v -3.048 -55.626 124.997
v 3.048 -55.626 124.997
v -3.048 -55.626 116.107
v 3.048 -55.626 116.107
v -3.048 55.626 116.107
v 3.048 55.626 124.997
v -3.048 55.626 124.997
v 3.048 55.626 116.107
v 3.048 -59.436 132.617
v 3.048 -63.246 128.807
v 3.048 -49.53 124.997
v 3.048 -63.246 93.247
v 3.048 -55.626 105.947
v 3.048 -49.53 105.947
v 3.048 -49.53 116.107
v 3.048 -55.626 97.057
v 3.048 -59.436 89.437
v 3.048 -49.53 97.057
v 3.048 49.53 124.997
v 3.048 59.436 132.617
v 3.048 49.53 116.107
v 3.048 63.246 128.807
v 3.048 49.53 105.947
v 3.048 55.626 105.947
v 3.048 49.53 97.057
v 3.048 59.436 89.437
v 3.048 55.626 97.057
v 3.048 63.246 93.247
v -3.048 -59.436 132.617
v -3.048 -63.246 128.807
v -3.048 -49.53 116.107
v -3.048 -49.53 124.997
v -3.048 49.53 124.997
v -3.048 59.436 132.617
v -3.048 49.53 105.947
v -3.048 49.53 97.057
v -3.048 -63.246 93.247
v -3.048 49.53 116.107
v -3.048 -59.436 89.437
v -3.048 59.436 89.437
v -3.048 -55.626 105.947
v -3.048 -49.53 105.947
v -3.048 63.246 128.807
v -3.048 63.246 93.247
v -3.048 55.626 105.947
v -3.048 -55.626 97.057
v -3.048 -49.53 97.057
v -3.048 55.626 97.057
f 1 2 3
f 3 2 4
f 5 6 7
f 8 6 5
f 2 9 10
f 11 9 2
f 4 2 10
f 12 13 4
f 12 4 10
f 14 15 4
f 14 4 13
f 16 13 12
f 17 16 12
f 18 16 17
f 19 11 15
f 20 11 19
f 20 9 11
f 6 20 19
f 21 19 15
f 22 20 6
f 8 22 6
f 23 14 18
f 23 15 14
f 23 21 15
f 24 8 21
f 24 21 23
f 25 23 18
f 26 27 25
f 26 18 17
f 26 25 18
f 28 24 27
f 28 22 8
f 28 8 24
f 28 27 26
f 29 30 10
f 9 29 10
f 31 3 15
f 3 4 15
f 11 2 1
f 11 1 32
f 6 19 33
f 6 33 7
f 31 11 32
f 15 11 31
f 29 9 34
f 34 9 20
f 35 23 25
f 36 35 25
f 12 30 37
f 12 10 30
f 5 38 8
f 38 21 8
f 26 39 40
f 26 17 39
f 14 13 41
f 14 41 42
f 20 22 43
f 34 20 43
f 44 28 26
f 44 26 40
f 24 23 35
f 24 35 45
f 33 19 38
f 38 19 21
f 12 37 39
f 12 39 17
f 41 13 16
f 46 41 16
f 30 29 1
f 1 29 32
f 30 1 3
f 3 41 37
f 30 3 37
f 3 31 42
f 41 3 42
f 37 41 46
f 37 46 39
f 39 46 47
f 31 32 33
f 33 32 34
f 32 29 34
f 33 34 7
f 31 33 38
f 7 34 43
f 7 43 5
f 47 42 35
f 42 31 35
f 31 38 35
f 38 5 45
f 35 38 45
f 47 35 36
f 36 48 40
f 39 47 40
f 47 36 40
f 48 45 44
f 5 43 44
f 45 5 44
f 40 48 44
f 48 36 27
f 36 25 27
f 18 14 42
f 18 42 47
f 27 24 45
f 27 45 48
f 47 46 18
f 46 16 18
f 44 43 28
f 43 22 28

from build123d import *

# Parameters (mm, degrees)
SKETCH1_W           = 43.18
SKETCH1_H           = 126.492
SKETCH1_W_2         = 8.89
SKETCH1_H_2         = 6.096
BOSS_EXTRUDE1_DEPTH = 3.048
CHAMFER1_SIZE       = 3.81


with BuildPart() as part:
    # Sketch1 → Boss-Extrude1 (new body, symmetric)
    with BuildSketch(Plane(origin=(0, 0, 0), x_dir=(0, 0, -1), z_dir=(1, 0, 0))):
        with Locations((-111.027292876, 0)):
            Rectangle(SKETCH1_W, SKETCH1_H)
        with Locations((-101.502292876, 52.578)):
            Rectangle(SKETCH1_W_2, SKETCH1_H_2, mode=Mode.SUBTRACT)
        with Locations((-120.552292876, 52.578)):
            Rectangle(SKETCH1_W_2, SKETCH1_H_2, mode=Mode.SUBTRACT)
        with Locations((-101.502292876, -52.578)):
            Rectangle(SKETCH1_W_2, SKETCH1_H_2, mode=Mode.SUBTRACT)
        with Locations((-120.552292876, -52.578)):
            Rectangle(SKETCH1_W_2, SKETCH1_H_2, mode=Mode.SUBTRACT)
    extrude(amount=BOSS_EXTRUDE1_DEPTH, both=True)

    # Chamfer1
    chamfer1_edges = [part.edges().sort_by_distance(p)[0] for p in [
        (0, -63.246, 89.437292876),
        (0, -63.246, 132.617292876),
        (0, 63.246, 132.617292876),
        (0, 63.246, 89.437292876),
    ]]
    chamfer(chamfer1_edges, length=CHAMFER1_SIZE)


solid = part.part
